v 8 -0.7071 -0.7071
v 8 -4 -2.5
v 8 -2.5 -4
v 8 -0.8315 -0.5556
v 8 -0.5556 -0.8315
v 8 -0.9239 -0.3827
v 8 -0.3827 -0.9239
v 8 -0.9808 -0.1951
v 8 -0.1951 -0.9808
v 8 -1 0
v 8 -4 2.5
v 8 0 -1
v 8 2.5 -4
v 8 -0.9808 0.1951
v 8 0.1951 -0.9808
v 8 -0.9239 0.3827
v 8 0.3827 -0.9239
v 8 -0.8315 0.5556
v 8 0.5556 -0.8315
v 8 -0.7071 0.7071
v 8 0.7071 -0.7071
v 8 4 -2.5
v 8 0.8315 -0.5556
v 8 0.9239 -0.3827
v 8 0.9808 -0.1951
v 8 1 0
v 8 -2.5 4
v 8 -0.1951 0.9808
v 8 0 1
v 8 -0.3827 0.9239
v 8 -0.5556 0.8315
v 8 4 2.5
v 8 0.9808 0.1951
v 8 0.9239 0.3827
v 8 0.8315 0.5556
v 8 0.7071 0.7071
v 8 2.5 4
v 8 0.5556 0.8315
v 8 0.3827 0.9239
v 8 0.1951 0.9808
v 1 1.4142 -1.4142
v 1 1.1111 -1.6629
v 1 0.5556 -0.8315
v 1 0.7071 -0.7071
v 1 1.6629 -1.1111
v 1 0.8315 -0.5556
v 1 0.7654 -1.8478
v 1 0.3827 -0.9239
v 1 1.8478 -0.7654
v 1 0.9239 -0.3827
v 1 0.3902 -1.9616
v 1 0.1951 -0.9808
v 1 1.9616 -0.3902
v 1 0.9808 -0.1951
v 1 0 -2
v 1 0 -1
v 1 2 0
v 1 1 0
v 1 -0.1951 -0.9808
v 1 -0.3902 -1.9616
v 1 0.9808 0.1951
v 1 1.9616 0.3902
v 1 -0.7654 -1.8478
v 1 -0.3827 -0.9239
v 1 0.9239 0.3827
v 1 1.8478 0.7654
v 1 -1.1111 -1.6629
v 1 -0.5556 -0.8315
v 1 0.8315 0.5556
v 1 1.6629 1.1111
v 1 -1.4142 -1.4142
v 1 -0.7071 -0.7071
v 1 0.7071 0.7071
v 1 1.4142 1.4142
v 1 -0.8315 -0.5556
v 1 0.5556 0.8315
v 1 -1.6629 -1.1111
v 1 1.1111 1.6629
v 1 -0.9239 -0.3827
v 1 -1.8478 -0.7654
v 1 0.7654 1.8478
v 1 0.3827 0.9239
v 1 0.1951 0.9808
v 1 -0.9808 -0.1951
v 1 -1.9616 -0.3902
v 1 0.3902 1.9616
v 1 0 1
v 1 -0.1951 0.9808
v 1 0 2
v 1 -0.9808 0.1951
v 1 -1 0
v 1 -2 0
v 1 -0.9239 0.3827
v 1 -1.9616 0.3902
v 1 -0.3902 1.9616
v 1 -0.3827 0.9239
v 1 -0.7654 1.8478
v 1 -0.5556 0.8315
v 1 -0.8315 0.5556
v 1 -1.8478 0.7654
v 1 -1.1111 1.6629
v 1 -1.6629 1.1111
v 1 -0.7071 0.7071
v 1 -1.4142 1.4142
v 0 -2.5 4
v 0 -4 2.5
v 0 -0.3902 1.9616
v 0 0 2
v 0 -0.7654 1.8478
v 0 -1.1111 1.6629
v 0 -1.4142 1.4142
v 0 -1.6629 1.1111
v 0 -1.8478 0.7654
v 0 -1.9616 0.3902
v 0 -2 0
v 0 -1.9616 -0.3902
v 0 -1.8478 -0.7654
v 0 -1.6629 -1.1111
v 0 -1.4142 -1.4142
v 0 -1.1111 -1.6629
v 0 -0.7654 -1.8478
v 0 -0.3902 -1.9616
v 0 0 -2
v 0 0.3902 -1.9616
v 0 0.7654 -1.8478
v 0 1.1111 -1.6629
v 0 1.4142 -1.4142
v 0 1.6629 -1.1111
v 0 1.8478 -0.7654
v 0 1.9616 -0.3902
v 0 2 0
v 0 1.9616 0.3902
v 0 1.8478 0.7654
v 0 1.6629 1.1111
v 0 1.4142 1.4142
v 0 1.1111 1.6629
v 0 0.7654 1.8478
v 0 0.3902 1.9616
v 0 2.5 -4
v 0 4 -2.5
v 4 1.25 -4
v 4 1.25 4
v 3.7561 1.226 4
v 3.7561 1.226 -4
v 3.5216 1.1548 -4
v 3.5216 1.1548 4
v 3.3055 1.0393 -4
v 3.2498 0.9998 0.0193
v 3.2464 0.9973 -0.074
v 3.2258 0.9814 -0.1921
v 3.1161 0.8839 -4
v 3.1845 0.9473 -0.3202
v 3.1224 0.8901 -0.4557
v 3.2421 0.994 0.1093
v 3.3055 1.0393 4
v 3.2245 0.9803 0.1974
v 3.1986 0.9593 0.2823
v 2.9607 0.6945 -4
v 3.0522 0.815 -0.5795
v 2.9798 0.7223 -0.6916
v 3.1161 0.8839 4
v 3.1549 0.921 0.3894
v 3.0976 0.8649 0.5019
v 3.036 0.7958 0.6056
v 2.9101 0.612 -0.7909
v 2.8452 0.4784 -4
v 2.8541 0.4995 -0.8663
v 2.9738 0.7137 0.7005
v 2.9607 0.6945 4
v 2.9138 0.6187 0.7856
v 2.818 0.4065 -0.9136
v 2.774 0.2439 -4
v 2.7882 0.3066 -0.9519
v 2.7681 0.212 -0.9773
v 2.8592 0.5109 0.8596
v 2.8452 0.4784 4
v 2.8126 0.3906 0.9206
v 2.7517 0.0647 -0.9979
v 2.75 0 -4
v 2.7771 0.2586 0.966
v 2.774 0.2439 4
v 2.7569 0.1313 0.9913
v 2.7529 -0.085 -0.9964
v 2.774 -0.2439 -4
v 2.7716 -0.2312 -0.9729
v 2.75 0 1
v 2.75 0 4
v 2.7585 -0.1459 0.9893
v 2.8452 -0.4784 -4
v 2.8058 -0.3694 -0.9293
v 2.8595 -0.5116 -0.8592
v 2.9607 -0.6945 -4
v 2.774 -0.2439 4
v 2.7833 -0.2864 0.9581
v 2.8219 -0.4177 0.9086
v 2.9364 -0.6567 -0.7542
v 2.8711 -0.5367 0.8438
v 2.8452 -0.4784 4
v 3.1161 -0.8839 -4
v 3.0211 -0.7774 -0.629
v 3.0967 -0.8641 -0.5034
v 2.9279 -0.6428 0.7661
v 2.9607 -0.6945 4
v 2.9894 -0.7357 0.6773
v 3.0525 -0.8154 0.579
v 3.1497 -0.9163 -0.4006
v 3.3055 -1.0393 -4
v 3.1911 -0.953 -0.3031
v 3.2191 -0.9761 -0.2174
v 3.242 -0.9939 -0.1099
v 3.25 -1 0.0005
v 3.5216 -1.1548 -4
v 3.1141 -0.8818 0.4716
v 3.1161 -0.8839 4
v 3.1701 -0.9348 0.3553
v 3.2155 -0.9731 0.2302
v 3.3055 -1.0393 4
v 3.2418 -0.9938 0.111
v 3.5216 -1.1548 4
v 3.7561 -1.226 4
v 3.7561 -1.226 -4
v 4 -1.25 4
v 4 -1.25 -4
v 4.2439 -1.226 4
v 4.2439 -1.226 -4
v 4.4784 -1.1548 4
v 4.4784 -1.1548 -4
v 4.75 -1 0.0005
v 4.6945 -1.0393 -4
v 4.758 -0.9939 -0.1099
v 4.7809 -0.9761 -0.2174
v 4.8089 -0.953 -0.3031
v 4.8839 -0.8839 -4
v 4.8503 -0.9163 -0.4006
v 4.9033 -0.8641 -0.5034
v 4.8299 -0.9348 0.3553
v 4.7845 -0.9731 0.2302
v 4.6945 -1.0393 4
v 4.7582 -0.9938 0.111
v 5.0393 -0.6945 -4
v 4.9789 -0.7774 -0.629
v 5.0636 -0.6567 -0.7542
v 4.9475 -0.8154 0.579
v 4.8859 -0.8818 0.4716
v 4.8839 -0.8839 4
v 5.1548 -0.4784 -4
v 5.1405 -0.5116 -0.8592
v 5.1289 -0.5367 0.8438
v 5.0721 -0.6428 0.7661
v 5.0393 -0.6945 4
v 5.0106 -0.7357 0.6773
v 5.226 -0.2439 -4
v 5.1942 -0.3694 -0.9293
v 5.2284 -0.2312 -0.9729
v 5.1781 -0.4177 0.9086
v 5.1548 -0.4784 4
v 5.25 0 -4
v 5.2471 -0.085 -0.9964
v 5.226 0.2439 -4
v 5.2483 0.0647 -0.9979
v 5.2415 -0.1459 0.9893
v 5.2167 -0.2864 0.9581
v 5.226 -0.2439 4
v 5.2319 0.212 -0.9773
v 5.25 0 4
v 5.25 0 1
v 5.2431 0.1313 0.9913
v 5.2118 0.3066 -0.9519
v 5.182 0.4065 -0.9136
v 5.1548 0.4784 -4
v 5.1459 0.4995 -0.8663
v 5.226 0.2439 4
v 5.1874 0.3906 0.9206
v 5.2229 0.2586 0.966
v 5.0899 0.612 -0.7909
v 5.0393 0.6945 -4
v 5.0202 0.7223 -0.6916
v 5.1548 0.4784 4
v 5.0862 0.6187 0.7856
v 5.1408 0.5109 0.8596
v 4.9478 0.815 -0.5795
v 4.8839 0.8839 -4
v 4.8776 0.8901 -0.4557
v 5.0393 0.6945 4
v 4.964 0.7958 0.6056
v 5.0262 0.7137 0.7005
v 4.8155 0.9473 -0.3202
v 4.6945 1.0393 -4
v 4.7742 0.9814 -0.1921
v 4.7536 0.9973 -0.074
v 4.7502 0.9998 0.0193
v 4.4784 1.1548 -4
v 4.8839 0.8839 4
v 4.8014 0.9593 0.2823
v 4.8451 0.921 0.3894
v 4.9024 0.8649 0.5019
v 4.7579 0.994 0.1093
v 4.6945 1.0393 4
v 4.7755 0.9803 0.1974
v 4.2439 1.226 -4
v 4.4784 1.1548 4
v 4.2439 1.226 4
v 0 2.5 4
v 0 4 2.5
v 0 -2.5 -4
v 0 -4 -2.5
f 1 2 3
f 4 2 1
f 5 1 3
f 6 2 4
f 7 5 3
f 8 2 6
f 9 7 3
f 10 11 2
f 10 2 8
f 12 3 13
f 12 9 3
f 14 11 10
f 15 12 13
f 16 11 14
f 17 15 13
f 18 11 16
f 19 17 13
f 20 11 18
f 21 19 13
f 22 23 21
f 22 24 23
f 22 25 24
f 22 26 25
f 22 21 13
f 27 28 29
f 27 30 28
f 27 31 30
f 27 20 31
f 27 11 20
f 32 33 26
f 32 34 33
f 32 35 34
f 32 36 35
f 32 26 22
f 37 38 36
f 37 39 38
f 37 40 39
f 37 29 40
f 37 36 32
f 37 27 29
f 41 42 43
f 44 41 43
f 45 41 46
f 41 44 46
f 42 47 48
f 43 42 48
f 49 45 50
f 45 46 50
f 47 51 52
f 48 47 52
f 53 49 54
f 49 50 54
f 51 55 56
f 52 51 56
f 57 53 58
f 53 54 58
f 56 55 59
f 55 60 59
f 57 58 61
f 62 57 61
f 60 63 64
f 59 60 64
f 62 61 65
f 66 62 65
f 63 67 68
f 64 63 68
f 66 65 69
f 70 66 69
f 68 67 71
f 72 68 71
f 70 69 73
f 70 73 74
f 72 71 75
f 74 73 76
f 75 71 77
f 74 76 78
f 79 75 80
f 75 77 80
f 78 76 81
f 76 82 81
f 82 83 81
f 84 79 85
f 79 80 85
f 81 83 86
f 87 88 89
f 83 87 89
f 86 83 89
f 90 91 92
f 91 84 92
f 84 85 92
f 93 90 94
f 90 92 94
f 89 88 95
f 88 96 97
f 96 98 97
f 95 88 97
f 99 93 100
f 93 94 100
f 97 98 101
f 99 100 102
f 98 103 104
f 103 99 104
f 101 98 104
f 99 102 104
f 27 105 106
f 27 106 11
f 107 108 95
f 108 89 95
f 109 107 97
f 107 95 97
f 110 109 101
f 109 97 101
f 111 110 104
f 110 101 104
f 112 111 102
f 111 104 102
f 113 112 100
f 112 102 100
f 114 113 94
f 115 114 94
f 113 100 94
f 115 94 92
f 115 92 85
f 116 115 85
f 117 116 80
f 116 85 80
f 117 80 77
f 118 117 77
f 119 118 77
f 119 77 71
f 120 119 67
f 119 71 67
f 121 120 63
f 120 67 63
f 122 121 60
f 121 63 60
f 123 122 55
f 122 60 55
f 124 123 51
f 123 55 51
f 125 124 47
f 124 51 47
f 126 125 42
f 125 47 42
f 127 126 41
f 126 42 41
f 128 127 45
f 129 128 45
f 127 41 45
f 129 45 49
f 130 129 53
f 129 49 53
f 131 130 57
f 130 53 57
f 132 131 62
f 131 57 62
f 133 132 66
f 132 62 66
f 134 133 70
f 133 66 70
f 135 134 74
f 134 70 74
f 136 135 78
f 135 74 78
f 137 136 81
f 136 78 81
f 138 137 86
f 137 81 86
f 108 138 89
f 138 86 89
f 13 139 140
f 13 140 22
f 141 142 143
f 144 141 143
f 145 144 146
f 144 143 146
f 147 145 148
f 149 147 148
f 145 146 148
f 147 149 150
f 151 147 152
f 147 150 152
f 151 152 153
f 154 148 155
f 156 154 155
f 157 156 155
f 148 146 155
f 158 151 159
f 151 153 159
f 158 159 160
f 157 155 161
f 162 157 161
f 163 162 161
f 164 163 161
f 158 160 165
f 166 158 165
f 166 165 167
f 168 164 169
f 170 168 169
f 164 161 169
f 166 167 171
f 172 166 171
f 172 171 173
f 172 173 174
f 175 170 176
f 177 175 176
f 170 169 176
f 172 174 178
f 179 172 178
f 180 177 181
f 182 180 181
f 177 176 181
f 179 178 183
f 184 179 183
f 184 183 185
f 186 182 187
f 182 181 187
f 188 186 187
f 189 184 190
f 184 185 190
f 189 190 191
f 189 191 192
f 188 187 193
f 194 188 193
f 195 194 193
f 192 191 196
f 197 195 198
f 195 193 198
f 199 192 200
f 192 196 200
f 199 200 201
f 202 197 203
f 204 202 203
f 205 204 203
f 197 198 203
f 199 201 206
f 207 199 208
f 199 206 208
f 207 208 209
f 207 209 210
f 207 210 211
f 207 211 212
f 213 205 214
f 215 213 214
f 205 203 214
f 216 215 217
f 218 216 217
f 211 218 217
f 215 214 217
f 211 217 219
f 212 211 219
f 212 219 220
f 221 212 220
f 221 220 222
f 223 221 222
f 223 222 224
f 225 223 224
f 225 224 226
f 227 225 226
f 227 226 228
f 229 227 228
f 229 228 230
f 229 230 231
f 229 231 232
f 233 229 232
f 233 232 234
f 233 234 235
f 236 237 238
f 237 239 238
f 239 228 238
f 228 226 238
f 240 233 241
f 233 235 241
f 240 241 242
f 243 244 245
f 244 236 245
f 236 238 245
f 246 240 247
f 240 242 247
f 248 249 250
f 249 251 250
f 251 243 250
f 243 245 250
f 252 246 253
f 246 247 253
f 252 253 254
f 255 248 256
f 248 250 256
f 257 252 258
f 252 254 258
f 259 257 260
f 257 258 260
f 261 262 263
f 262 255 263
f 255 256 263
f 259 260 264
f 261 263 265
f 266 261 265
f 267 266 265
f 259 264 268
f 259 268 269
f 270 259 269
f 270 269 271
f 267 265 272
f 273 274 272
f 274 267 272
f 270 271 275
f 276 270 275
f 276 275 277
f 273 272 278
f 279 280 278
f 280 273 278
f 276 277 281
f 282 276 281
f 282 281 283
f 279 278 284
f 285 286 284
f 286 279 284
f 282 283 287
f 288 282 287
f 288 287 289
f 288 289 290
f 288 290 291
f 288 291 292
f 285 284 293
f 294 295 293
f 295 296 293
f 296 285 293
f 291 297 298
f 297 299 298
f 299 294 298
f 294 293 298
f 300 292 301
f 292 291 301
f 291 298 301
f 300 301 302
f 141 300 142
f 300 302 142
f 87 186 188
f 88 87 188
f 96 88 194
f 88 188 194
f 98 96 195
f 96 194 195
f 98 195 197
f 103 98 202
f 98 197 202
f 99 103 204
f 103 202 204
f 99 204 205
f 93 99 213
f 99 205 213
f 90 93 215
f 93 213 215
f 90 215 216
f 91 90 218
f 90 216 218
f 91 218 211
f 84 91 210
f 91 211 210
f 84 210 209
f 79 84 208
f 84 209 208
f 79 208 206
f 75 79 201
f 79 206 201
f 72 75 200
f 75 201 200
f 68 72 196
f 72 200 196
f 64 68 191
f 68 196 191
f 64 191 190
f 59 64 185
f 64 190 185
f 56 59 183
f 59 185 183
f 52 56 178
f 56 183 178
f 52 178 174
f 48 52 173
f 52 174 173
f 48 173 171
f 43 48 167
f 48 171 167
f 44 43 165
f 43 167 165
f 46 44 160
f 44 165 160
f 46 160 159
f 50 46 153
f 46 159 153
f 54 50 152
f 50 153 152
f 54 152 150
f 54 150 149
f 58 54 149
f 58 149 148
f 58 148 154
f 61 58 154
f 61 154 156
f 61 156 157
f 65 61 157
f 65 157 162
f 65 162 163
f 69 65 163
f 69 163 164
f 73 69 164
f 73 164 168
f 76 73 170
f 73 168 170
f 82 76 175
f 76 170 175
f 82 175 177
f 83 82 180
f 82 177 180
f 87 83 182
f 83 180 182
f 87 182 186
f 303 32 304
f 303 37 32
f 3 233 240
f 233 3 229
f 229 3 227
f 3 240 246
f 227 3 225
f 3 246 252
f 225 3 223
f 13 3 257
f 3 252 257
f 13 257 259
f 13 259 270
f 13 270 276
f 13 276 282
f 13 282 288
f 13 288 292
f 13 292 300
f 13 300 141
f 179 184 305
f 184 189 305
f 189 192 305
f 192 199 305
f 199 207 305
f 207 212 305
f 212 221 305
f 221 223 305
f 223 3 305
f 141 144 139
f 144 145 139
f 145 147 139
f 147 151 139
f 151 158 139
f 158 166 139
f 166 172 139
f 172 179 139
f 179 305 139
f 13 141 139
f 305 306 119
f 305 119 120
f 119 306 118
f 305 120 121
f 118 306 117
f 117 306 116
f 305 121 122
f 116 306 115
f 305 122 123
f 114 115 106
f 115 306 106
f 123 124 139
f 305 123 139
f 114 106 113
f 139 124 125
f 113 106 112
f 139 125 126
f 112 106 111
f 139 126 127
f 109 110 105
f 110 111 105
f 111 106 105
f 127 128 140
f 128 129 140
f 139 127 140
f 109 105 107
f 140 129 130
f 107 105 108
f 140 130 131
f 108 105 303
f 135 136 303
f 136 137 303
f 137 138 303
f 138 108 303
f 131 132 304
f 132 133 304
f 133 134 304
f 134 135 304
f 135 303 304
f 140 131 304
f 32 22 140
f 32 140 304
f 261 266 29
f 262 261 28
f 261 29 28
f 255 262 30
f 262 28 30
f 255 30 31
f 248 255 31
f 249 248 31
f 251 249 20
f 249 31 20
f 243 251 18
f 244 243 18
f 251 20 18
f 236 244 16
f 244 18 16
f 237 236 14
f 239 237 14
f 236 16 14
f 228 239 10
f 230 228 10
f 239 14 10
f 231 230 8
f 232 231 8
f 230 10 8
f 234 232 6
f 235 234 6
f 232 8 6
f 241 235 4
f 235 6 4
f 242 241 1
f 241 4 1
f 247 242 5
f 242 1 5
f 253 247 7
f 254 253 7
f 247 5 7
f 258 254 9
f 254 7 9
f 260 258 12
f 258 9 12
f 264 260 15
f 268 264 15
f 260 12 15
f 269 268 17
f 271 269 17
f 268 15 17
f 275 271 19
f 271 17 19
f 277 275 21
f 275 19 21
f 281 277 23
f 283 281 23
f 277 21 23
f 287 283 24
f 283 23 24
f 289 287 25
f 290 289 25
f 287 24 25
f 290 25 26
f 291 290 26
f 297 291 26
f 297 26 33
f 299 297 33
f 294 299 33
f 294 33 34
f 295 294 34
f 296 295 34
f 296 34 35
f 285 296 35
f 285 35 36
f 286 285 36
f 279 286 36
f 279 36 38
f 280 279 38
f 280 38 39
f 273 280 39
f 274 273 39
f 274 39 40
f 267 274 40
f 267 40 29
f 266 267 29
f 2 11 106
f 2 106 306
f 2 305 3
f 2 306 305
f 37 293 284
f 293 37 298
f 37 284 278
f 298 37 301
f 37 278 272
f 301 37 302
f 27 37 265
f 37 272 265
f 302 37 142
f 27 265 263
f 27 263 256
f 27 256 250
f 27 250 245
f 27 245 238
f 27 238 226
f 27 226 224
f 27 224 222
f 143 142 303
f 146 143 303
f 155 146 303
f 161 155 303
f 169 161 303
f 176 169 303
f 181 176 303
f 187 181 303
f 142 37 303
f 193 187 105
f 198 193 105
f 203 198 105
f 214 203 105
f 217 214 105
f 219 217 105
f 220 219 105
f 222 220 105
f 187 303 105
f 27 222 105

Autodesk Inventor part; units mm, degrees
ref_plane "YZ Plane" through (0, 0, 0) normal (1, 0, 0) x (0, 1, 0)
ref_plane "XZ Plane" through (0, 0, 0) normal (0, 1, 0) x (-1, 0, 0)
ref_plane "XY Plane" through (0, 0, 0) normal (0, 0, 1) x (1, 0, 0)
sketch "Skizze2" plane through (0, 0, 0) normal (1, 0, 0) x (0, 1, 0)
  line L0 (4, 4) -> (-4, 4)
  line L1 (-4, 4) -> (-4, -4)
  line L2 (-4, -4) -> (4, -4)
  line L3 (4, -4) -> (4, 4)
  point P0 (0, 0)
  point P1 (0, 0)
  dimension "d7" = 8
  dimension "d8" = 8
  dimension "d9" = 4
  dimension "d10" = 4
extrude "Extrusion1" add sketch "Skizze2" along normal blind 8
chamfer "Fase1" distance 1.5 angle 45 4 edges at (4, 4, 4) (4, 4, -4) (4, -4, 4) (4, -4, -4)
hole "Bohrung1" at (0, 0, 0) direction (1, 0, 0) diameter 2 end through all counterbore diameter 4 counterbore depth 1
sketch "Skizze3" plane through (0, -2.5, -4) normal (0, 0, -1) x (-1, 0, 0)
  line L0 (0, 0) -> (0, 5) projected
  line L1 (-8, -1.5) -> (0, -1.5) projected
  point P0 (0, 2.5)
  point P1 (-4, 2.5)
  dimension "d23" = 4
  dimension "d24" = 4
hole "Bohrung2" at (4, 0, -4) direction (0, 0, 1) diameter 2.5 end through all
thread "Gewinde1" size "M3x0.5" class "6H" standard "ANSI Metric M Profile" full length
properties part number "Aluminium_Block_Motor"
